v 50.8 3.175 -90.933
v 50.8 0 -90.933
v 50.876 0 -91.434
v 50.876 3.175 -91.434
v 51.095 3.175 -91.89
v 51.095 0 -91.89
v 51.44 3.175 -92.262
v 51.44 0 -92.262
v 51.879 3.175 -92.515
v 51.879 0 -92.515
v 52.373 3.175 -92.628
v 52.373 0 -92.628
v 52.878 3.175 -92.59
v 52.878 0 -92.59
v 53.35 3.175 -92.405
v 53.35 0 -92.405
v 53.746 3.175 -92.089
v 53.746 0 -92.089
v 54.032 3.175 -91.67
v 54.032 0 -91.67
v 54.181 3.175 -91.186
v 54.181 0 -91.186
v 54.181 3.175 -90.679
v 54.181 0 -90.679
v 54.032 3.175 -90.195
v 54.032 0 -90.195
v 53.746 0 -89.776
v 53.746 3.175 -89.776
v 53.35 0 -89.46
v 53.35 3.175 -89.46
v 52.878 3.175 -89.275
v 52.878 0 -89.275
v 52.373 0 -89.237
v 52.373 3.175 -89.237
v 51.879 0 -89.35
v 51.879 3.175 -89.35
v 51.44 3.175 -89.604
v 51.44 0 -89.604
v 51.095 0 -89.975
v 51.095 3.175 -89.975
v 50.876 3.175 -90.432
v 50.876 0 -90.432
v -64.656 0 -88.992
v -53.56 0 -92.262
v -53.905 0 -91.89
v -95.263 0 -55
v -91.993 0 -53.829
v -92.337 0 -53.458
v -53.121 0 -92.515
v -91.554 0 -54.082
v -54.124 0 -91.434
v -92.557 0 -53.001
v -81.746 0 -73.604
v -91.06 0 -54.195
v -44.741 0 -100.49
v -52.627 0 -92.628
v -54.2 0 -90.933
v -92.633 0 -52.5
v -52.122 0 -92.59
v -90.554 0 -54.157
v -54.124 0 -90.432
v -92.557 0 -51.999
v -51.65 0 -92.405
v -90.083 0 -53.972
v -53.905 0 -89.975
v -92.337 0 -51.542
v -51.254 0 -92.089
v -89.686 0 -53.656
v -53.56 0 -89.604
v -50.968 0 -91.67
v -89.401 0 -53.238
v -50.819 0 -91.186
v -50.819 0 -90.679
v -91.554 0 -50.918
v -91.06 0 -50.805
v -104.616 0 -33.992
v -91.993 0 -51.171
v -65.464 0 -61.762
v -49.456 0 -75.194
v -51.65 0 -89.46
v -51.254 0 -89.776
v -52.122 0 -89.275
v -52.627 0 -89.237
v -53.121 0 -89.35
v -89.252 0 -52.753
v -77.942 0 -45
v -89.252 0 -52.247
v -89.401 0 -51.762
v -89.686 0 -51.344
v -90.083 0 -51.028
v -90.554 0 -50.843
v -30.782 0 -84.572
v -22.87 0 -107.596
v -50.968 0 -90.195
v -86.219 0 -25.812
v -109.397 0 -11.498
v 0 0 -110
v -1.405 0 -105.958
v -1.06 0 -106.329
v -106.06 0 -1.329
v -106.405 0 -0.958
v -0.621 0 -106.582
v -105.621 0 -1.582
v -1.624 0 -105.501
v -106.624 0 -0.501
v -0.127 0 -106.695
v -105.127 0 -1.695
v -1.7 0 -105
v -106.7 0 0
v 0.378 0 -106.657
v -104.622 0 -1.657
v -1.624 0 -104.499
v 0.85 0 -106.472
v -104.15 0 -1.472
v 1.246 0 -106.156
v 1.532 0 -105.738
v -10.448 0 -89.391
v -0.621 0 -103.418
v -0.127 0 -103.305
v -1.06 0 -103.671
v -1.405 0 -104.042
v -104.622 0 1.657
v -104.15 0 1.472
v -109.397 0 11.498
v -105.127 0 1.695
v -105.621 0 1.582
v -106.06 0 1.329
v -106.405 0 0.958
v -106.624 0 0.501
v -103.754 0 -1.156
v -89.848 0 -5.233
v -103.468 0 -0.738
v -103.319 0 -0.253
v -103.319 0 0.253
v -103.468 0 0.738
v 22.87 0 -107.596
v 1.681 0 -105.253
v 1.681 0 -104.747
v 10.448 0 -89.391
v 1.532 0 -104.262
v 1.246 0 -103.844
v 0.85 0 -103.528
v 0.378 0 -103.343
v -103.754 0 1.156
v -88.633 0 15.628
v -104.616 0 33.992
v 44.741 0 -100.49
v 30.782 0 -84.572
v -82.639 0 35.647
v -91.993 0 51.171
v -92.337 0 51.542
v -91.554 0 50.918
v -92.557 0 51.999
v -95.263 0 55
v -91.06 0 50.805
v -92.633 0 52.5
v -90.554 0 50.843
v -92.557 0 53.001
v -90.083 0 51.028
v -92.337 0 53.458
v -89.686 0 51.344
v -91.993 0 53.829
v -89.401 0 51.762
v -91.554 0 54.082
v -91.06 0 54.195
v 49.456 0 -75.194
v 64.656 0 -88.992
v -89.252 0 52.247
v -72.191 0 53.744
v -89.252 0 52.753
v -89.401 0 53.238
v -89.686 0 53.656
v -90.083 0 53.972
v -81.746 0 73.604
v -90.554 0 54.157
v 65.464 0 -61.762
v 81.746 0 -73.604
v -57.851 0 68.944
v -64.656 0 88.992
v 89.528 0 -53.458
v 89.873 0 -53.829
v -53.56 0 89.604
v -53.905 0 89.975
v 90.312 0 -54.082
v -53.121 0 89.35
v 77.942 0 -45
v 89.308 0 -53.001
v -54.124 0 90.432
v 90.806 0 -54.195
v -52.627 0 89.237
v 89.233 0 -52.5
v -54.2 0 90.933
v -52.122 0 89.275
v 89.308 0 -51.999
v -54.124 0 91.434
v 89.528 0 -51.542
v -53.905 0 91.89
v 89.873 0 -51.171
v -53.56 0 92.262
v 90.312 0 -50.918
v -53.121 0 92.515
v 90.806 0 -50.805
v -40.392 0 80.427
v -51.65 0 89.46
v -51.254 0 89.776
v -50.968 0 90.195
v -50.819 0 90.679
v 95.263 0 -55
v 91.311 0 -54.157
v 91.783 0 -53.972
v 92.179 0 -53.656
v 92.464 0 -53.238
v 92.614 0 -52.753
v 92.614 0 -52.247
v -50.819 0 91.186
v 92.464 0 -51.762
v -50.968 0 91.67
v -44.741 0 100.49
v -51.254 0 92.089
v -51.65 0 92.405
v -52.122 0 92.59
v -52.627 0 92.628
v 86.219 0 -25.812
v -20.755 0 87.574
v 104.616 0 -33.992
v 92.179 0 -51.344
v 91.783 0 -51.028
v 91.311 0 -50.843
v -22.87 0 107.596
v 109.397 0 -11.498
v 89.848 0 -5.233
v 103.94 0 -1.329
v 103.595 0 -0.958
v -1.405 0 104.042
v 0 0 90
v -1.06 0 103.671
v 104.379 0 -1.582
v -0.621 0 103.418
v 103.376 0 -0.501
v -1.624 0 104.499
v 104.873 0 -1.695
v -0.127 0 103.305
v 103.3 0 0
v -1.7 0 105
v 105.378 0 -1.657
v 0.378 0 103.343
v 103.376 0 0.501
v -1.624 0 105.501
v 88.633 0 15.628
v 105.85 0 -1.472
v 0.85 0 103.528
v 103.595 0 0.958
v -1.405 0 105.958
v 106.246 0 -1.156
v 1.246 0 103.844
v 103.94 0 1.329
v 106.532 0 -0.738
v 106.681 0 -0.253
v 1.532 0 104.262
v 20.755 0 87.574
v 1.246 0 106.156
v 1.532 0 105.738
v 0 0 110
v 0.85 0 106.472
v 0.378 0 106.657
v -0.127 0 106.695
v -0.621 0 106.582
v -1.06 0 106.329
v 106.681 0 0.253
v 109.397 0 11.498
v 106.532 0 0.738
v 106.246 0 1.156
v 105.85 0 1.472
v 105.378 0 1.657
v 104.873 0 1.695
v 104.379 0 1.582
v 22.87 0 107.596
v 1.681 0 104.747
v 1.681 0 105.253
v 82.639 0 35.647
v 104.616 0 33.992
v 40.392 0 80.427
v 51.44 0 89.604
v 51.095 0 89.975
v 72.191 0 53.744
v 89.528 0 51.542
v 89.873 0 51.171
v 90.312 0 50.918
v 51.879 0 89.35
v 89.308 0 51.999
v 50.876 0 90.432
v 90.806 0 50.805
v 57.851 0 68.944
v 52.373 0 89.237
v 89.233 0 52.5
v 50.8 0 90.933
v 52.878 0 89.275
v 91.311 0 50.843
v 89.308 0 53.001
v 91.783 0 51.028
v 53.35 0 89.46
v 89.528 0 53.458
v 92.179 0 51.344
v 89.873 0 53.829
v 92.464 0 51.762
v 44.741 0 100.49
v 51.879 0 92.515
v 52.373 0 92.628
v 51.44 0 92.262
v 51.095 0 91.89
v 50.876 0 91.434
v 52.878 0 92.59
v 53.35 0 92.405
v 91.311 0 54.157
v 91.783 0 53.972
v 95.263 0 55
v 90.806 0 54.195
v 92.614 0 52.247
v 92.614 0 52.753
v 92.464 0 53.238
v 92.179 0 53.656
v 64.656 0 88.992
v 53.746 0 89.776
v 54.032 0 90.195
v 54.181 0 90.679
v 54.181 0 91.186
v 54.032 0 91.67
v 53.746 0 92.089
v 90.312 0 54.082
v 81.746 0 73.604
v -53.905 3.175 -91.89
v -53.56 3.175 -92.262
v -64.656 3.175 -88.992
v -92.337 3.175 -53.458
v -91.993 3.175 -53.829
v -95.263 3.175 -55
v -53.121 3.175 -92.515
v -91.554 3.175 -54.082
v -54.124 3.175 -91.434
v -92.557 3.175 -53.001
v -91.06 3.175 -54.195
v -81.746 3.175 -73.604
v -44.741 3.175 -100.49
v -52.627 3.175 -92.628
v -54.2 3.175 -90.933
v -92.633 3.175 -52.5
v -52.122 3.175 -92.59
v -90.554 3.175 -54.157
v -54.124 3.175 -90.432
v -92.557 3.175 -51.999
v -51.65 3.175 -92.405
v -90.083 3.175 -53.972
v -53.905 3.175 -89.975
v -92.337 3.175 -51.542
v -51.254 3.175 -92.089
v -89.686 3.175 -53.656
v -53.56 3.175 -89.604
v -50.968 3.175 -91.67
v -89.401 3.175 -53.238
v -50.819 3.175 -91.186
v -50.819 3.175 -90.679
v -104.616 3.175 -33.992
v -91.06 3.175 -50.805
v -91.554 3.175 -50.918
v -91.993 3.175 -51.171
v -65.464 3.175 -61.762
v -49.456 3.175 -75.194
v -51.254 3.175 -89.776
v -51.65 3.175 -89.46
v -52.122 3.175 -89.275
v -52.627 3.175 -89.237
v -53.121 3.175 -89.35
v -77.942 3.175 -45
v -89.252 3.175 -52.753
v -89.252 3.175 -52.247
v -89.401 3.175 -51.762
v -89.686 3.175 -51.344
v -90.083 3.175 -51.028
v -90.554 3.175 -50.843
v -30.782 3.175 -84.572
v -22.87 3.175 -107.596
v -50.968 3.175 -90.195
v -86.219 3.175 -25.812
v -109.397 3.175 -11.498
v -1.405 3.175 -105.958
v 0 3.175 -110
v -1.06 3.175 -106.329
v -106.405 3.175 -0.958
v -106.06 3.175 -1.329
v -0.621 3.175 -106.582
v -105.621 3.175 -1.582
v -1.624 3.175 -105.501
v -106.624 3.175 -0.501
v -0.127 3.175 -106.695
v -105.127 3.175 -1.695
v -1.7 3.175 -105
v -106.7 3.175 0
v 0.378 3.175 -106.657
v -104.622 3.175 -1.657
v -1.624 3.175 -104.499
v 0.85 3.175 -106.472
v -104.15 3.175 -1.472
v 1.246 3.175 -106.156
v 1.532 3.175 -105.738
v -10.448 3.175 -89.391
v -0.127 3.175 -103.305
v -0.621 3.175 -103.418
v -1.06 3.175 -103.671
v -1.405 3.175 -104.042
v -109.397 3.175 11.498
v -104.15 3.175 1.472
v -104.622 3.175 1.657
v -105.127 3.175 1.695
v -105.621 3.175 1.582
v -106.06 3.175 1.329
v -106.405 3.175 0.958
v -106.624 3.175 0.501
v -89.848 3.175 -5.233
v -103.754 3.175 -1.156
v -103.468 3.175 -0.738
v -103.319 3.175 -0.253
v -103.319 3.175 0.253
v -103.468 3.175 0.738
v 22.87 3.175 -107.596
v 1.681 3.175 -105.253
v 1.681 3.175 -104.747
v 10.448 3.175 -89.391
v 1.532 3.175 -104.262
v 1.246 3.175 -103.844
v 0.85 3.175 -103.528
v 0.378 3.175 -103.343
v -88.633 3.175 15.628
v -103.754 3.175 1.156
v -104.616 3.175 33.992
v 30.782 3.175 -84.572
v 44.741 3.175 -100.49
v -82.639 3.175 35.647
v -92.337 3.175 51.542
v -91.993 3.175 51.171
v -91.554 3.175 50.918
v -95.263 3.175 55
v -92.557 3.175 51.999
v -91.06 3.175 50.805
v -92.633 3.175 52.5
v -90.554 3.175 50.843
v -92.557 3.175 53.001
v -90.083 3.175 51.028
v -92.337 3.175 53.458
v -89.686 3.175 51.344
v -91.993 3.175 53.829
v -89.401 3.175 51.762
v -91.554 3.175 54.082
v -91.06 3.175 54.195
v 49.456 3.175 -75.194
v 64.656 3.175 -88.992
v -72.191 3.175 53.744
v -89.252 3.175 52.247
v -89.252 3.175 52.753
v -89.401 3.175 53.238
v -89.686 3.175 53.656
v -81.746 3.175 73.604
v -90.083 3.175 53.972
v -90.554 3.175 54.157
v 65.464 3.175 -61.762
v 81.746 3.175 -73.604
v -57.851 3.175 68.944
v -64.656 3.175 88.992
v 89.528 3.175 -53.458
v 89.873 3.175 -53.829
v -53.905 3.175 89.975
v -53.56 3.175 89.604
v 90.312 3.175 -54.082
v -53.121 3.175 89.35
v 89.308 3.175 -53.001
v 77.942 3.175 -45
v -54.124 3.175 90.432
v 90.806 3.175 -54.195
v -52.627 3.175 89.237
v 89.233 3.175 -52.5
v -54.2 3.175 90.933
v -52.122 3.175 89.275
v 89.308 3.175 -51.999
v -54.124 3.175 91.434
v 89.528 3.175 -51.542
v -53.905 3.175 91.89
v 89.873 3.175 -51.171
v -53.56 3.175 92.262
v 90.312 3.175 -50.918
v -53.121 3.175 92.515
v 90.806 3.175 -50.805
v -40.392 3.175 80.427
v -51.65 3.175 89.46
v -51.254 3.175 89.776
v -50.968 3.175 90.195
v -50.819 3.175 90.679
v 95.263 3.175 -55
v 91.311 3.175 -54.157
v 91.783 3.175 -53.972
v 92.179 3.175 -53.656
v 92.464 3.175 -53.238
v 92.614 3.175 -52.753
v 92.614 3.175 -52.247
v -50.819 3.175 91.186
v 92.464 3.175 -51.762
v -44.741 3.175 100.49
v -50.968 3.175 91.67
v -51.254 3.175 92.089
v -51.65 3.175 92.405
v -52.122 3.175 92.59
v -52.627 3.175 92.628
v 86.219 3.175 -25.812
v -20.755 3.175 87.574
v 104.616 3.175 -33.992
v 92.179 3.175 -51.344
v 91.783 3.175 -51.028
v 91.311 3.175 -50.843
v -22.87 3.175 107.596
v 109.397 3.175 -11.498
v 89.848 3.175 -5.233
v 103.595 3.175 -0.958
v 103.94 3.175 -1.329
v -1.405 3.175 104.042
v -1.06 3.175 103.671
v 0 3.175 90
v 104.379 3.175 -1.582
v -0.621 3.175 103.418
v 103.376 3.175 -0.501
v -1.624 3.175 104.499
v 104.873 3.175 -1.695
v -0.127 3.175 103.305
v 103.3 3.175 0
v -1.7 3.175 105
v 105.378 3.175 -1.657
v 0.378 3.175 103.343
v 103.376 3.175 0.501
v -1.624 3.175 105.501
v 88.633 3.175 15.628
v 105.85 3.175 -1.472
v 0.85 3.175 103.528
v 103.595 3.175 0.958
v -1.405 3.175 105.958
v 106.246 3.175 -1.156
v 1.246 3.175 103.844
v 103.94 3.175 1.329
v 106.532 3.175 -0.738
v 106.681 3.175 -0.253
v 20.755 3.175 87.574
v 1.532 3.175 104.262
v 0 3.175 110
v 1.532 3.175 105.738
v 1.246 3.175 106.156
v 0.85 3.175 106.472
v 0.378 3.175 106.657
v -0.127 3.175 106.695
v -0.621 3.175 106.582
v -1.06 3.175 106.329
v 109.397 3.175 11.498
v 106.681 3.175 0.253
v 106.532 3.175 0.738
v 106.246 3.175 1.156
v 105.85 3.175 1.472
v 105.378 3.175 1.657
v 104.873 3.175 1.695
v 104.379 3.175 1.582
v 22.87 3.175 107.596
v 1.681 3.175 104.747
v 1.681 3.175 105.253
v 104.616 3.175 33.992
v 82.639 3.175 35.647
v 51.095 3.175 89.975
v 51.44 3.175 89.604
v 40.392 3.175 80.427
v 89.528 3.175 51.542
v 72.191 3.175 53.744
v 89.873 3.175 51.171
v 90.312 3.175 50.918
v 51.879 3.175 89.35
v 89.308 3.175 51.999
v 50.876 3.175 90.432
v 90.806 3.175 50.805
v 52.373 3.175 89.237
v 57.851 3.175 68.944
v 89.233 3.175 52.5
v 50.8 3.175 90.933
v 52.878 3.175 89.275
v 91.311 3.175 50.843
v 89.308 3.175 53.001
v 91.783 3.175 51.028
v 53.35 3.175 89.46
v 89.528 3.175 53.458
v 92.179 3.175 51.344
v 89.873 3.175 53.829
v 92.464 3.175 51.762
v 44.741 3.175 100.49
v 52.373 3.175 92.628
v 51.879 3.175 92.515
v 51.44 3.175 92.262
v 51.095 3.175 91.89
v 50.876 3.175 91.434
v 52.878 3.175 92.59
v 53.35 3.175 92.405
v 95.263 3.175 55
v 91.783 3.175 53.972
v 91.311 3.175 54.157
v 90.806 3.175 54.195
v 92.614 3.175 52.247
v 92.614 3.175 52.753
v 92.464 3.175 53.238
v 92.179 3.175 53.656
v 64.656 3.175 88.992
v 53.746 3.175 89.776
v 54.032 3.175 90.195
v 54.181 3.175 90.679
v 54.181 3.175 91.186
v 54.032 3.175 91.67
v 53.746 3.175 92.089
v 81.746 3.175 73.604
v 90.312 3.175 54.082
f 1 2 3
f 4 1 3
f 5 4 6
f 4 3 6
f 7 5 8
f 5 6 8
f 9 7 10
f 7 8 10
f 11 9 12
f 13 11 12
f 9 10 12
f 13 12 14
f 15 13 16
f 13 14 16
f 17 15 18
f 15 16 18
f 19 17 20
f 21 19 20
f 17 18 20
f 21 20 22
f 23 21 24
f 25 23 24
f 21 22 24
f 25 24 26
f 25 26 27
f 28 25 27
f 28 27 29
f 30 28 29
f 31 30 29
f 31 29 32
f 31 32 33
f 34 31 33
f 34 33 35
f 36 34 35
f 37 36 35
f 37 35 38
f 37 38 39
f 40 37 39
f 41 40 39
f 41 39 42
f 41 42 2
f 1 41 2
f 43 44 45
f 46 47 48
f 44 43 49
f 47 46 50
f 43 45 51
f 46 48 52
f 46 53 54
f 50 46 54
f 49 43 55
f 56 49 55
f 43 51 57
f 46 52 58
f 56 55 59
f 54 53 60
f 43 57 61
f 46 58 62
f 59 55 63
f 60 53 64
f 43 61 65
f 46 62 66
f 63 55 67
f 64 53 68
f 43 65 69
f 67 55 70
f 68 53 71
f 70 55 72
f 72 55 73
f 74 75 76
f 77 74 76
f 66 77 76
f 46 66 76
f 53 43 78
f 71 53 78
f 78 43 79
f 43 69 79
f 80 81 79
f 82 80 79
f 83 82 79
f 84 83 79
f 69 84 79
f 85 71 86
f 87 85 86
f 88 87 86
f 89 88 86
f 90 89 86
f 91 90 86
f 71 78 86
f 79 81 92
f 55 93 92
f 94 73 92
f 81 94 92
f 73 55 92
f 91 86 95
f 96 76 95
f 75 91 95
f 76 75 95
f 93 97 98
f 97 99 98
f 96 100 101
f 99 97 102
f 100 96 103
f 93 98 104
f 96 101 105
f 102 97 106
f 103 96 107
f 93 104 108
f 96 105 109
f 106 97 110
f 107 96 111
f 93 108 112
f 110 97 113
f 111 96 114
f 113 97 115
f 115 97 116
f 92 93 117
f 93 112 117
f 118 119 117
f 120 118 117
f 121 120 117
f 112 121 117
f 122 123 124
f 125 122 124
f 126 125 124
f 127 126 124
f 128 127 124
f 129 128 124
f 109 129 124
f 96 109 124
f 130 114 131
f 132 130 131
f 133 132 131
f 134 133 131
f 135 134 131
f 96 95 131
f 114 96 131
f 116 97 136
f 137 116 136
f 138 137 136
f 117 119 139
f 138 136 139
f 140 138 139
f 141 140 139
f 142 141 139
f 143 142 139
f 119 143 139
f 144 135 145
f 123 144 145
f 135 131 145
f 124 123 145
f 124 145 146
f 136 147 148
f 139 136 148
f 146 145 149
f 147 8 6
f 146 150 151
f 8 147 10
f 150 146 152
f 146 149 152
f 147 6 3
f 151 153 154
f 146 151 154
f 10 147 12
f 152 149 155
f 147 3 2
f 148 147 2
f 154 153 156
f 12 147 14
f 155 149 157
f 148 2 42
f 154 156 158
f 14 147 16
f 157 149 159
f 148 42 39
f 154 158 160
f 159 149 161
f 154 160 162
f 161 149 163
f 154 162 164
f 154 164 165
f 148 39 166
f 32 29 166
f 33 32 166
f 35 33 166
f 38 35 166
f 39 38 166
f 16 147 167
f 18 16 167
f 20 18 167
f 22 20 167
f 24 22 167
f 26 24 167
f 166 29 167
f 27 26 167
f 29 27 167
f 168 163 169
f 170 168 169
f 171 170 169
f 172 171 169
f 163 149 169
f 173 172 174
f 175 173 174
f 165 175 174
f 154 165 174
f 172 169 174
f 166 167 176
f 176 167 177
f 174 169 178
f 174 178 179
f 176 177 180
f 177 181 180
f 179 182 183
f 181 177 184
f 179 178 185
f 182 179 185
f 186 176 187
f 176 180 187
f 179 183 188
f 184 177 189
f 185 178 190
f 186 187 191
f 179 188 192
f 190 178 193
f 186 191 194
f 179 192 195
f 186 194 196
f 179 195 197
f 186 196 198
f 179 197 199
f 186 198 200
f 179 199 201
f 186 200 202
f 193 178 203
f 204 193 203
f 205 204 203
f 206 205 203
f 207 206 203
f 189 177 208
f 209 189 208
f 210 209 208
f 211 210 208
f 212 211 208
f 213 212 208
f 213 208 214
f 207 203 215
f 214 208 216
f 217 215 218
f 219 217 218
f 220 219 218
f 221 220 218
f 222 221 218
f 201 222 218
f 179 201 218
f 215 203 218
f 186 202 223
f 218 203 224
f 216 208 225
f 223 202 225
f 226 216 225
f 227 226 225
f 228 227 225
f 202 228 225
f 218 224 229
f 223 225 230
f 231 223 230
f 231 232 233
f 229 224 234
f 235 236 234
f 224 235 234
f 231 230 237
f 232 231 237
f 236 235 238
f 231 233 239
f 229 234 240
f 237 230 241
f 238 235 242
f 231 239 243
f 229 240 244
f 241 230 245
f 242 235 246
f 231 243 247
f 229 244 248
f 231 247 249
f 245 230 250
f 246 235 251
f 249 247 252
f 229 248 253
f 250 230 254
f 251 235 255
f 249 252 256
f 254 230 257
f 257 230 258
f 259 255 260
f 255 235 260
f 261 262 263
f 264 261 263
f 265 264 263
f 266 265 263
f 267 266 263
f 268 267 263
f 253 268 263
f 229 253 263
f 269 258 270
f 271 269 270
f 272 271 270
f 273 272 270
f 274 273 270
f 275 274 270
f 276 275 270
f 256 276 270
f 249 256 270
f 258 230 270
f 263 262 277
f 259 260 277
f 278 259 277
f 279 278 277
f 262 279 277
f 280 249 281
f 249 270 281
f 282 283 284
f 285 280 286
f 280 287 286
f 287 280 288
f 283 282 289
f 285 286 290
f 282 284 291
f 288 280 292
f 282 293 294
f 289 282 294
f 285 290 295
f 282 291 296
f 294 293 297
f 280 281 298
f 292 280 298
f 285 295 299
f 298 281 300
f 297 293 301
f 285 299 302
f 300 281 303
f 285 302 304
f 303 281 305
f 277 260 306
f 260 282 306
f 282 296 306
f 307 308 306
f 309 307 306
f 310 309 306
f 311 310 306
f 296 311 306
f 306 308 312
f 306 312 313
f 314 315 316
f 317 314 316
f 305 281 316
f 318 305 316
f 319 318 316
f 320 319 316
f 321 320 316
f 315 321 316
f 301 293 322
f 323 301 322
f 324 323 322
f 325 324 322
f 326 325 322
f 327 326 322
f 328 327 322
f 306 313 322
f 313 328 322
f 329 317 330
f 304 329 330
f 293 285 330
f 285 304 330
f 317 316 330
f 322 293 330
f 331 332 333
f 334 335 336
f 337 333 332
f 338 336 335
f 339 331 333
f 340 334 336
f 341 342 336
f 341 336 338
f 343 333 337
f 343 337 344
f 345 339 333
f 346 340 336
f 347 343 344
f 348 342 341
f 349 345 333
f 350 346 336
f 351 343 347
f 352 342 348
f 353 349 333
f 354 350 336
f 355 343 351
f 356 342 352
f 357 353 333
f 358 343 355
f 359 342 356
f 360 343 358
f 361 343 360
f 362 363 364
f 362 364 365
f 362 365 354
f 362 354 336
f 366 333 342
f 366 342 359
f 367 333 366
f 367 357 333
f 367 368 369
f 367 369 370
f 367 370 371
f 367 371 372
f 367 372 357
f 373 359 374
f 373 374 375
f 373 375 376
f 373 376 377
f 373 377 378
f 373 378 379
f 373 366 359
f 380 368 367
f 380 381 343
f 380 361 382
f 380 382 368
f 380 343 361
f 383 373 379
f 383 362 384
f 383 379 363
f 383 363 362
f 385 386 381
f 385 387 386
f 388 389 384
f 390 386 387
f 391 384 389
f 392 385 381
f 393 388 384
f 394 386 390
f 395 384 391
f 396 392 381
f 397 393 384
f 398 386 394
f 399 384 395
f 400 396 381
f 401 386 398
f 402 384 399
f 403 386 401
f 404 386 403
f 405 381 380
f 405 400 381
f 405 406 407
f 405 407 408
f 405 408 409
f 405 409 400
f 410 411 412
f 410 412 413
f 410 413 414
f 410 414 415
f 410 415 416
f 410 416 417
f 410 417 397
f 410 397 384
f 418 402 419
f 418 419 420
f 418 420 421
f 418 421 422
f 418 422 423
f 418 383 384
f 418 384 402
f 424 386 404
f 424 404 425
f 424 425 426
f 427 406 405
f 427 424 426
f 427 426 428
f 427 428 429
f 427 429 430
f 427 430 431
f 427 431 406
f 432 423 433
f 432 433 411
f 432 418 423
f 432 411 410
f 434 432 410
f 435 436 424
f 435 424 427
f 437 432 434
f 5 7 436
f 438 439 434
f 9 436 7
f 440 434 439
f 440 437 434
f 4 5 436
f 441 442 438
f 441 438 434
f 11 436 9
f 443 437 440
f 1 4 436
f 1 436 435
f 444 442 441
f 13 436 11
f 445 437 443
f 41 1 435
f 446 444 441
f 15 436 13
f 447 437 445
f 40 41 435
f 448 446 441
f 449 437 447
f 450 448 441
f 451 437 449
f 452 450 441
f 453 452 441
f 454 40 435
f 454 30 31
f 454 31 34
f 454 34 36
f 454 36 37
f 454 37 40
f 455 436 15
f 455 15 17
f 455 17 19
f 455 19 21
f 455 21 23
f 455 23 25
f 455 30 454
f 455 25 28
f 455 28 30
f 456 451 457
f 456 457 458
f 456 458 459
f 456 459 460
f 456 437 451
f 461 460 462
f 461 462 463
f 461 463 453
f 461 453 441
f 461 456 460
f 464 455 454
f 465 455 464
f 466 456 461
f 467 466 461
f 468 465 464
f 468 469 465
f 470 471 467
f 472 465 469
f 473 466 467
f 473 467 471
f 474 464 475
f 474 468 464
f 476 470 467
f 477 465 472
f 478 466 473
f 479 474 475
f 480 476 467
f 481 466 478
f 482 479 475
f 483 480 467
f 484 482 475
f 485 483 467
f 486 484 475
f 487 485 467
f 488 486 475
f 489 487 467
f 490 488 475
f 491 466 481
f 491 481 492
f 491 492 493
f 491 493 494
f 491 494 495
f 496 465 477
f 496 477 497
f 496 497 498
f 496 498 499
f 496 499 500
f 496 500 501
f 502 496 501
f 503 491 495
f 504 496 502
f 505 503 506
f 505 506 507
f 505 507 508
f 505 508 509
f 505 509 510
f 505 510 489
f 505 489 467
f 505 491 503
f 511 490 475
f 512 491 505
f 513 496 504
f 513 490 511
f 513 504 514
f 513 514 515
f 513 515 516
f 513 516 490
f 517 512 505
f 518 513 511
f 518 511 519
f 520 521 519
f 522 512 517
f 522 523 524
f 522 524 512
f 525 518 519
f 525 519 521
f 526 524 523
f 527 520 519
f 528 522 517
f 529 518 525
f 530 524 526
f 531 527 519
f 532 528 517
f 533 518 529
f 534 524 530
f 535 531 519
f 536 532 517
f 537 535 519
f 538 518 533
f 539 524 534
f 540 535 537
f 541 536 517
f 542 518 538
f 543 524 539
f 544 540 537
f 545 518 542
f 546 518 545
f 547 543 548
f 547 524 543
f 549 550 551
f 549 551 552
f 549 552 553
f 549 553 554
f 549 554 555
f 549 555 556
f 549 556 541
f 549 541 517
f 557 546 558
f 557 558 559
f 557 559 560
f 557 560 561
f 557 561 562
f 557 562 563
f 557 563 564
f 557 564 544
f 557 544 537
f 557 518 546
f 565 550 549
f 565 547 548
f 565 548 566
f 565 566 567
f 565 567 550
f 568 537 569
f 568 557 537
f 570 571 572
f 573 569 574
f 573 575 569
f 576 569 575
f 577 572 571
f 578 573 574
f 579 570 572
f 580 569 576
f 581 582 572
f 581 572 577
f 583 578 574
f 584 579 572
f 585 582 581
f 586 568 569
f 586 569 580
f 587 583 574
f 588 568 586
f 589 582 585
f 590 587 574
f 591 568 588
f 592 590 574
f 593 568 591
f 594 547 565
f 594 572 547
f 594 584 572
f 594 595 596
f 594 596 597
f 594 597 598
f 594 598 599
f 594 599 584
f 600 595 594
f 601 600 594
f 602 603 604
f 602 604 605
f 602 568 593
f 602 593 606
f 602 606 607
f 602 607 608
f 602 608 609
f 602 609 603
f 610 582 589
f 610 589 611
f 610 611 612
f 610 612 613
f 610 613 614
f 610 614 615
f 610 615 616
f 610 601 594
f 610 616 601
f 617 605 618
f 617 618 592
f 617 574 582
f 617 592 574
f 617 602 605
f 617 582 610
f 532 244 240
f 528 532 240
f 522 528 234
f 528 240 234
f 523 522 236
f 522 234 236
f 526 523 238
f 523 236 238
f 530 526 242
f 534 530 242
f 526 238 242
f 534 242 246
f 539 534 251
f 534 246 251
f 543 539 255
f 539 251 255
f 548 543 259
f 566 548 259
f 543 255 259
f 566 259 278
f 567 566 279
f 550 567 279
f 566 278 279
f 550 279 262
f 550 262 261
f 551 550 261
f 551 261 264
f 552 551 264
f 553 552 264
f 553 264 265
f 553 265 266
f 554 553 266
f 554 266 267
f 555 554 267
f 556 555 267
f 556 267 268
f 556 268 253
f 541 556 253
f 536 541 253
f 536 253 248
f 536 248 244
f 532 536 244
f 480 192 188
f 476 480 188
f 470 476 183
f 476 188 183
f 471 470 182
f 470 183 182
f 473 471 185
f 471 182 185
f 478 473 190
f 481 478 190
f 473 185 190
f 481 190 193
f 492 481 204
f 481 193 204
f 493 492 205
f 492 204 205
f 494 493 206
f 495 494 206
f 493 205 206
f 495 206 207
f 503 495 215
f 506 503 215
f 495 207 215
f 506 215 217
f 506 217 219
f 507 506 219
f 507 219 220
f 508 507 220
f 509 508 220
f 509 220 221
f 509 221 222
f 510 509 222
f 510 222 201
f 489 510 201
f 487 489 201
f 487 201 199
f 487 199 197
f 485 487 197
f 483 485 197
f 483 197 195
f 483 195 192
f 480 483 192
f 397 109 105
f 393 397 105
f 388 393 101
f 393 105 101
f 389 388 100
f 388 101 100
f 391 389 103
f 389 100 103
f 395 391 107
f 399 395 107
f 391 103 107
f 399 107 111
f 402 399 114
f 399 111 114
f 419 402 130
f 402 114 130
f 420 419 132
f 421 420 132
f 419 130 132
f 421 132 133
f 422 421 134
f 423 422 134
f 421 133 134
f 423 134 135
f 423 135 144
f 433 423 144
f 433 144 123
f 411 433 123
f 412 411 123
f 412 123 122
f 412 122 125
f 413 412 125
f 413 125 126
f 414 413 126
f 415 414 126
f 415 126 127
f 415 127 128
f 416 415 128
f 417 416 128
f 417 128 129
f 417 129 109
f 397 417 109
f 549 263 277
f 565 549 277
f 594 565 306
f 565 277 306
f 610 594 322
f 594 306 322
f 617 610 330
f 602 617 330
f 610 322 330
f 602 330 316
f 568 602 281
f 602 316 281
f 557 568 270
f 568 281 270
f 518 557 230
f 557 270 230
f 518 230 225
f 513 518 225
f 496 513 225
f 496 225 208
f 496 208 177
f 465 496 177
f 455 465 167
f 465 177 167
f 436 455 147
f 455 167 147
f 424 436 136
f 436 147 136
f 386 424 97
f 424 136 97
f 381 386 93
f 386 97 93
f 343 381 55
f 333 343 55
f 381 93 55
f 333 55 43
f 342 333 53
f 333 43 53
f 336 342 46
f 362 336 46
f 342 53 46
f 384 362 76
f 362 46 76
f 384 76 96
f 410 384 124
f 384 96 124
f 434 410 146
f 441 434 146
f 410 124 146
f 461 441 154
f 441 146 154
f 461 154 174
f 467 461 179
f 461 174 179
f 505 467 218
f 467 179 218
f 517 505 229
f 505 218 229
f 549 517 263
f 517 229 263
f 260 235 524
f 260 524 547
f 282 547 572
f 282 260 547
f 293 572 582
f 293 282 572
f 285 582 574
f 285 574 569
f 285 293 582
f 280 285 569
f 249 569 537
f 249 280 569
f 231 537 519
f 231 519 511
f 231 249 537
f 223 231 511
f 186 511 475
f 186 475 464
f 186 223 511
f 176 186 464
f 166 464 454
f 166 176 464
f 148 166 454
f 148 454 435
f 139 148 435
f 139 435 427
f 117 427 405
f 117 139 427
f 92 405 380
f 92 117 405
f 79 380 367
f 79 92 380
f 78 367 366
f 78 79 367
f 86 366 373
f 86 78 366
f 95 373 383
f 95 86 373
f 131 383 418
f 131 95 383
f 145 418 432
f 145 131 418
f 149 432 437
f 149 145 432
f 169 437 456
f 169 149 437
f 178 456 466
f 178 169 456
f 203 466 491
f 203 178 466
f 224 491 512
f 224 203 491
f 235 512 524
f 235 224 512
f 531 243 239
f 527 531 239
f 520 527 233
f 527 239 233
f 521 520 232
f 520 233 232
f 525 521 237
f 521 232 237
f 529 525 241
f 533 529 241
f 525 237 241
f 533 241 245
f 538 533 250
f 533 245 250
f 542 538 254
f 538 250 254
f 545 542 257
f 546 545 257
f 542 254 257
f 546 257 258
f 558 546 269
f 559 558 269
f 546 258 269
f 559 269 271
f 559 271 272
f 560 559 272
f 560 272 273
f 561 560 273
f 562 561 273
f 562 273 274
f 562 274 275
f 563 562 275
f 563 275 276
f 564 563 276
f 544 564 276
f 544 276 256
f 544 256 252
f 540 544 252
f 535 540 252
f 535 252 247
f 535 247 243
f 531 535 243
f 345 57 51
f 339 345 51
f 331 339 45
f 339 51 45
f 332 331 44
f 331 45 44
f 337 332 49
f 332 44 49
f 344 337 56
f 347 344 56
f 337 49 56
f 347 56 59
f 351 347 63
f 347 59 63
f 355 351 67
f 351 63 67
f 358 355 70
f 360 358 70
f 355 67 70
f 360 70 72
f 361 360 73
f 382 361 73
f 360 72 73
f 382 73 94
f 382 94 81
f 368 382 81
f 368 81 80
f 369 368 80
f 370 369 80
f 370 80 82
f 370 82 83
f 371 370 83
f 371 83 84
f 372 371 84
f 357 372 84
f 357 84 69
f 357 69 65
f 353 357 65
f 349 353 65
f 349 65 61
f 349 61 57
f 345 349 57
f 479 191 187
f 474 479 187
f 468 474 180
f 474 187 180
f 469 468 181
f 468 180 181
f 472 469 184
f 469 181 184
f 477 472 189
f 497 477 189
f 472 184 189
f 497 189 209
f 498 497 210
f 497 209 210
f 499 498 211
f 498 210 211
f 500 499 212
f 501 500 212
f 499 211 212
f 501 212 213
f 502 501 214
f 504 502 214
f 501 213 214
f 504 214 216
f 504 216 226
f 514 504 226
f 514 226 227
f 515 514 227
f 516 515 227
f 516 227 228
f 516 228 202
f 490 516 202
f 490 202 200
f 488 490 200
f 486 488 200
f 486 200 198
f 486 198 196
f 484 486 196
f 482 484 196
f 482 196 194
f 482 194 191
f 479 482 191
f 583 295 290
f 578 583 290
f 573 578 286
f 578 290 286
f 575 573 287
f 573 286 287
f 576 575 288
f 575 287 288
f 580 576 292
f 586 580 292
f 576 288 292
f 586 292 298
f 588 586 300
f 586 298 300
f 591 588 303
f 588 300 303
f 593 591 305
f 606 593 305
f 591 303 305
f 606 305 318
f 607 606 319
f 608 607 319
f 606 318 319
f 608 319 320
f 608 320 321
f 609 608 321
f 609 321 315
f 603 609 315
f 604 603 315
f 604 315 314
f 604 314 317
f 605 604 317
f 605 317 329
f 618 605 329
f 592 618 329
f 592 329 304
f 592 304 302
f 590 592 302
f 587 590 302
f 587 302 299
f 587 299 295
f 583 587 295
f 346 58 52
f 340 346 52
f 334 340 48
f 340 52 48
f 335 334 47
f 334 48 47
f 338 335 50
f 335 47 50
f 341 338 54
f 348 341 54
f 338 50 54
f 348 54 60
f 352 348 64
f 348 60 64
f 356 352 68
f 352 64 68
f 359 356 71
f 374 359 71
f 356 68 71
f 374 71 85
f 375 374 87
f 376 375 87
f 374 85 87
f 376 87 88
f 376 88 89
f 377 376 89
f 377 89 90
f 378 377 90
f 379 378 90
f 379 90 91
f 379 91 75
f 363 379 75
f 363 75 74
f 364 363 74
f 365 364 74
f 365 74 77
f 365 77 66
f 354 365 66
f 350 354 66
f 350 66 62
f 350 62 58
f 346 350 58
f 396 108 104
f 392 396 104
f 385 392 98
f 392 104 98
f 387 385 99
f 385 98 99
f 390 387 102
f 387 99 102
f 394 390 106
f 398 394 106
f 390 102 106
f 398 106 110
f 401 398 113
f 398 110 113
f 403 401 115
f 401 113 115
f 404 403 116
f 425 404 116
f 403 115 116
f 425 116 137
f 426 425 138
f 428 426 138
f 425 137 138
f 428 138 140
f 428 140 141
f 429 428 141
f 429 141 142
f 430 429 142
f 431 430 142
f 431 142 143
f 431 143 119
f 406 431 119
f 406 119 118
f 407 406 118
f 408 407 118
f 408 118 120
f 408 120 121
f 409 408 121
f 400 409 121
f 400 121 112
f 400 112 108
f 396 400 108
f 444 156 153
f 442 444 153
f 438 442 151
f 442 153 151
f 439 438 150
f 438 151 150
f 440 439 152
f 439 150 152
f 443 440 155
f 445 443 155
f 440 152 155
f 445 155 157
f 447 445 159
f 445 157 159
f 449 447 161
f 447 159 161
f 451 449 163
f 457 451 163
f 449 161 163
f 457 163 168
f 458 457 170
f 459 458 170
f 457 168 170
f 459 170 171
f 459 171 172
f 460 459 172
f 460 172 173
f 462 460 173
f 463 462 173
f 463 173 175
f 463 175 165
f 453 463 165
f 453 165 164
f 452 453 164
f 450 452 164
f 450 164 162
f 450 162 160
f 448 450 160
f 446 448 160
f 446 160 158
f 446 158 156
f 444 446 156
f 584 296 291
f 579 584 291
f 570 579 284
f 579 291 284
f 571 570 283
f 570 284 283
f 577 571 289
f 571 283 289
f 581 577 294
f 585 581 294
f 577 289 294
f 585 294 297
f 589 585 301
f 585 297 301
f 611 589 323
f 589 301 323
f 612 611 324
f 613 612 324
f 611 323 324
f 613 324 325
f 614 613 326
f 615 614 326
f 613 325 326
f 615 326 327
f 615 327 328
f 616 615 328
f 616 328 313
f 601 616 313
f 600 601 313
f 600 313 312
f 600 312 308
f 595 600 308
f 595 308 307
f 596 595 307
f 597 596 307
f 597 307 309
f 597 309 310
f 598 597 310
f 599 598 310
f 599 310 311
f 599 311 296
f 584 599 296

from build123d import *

# Parameters (mm, degrees)
SKETCH1_R            = 110
SKETCH1_R_2          = 90
BOSS_EXTRUDE1_DEPTH  = 3.175
M3_CLEARANCE_HOLE1_D = 3.4


with BuildPart() as part:
    # Sketch1 → Boss-Extrude1 (new body)
    with BuildSketch(Plane(origin=(0, 0, 0), x_dir=(1, 0, 0), z_dir=(0, 1, 0))):
        with Locations(Location((0, 0, 0), (0, 0, 270))):
            Circle(SKETCH1_R)
        with Locations(Location((0, 0, 0), (0, 0, 270))):
            Circle(SKETCH1_R_2, mode=Mode.SUBTRACT)
    extrude(amount=BOSS_EXTRUDE1_DEPTH)

    # M3 Clearance Hole1 (through all)
    with Locations(Plane(origin=(0, 3.175, 0), x_dir=(1, 0, 0), z_dir=(0, 1, 0))):
        with Locations((0, 105), (52.5, 90.932667397), (90.932667397, 52.5), (105, 0), (90.932667397, -52.5), (52.5, -90.932667397), (0, -105), (-52.5, -90.932667397), (-90.932667397, -52.5), (-105, 0), (-90.932667397, 52.5), (-52.5, 90.932667397)):
            Hole(M3_CLEARANCE_HOLE1_D / 2)


solid = part.part
